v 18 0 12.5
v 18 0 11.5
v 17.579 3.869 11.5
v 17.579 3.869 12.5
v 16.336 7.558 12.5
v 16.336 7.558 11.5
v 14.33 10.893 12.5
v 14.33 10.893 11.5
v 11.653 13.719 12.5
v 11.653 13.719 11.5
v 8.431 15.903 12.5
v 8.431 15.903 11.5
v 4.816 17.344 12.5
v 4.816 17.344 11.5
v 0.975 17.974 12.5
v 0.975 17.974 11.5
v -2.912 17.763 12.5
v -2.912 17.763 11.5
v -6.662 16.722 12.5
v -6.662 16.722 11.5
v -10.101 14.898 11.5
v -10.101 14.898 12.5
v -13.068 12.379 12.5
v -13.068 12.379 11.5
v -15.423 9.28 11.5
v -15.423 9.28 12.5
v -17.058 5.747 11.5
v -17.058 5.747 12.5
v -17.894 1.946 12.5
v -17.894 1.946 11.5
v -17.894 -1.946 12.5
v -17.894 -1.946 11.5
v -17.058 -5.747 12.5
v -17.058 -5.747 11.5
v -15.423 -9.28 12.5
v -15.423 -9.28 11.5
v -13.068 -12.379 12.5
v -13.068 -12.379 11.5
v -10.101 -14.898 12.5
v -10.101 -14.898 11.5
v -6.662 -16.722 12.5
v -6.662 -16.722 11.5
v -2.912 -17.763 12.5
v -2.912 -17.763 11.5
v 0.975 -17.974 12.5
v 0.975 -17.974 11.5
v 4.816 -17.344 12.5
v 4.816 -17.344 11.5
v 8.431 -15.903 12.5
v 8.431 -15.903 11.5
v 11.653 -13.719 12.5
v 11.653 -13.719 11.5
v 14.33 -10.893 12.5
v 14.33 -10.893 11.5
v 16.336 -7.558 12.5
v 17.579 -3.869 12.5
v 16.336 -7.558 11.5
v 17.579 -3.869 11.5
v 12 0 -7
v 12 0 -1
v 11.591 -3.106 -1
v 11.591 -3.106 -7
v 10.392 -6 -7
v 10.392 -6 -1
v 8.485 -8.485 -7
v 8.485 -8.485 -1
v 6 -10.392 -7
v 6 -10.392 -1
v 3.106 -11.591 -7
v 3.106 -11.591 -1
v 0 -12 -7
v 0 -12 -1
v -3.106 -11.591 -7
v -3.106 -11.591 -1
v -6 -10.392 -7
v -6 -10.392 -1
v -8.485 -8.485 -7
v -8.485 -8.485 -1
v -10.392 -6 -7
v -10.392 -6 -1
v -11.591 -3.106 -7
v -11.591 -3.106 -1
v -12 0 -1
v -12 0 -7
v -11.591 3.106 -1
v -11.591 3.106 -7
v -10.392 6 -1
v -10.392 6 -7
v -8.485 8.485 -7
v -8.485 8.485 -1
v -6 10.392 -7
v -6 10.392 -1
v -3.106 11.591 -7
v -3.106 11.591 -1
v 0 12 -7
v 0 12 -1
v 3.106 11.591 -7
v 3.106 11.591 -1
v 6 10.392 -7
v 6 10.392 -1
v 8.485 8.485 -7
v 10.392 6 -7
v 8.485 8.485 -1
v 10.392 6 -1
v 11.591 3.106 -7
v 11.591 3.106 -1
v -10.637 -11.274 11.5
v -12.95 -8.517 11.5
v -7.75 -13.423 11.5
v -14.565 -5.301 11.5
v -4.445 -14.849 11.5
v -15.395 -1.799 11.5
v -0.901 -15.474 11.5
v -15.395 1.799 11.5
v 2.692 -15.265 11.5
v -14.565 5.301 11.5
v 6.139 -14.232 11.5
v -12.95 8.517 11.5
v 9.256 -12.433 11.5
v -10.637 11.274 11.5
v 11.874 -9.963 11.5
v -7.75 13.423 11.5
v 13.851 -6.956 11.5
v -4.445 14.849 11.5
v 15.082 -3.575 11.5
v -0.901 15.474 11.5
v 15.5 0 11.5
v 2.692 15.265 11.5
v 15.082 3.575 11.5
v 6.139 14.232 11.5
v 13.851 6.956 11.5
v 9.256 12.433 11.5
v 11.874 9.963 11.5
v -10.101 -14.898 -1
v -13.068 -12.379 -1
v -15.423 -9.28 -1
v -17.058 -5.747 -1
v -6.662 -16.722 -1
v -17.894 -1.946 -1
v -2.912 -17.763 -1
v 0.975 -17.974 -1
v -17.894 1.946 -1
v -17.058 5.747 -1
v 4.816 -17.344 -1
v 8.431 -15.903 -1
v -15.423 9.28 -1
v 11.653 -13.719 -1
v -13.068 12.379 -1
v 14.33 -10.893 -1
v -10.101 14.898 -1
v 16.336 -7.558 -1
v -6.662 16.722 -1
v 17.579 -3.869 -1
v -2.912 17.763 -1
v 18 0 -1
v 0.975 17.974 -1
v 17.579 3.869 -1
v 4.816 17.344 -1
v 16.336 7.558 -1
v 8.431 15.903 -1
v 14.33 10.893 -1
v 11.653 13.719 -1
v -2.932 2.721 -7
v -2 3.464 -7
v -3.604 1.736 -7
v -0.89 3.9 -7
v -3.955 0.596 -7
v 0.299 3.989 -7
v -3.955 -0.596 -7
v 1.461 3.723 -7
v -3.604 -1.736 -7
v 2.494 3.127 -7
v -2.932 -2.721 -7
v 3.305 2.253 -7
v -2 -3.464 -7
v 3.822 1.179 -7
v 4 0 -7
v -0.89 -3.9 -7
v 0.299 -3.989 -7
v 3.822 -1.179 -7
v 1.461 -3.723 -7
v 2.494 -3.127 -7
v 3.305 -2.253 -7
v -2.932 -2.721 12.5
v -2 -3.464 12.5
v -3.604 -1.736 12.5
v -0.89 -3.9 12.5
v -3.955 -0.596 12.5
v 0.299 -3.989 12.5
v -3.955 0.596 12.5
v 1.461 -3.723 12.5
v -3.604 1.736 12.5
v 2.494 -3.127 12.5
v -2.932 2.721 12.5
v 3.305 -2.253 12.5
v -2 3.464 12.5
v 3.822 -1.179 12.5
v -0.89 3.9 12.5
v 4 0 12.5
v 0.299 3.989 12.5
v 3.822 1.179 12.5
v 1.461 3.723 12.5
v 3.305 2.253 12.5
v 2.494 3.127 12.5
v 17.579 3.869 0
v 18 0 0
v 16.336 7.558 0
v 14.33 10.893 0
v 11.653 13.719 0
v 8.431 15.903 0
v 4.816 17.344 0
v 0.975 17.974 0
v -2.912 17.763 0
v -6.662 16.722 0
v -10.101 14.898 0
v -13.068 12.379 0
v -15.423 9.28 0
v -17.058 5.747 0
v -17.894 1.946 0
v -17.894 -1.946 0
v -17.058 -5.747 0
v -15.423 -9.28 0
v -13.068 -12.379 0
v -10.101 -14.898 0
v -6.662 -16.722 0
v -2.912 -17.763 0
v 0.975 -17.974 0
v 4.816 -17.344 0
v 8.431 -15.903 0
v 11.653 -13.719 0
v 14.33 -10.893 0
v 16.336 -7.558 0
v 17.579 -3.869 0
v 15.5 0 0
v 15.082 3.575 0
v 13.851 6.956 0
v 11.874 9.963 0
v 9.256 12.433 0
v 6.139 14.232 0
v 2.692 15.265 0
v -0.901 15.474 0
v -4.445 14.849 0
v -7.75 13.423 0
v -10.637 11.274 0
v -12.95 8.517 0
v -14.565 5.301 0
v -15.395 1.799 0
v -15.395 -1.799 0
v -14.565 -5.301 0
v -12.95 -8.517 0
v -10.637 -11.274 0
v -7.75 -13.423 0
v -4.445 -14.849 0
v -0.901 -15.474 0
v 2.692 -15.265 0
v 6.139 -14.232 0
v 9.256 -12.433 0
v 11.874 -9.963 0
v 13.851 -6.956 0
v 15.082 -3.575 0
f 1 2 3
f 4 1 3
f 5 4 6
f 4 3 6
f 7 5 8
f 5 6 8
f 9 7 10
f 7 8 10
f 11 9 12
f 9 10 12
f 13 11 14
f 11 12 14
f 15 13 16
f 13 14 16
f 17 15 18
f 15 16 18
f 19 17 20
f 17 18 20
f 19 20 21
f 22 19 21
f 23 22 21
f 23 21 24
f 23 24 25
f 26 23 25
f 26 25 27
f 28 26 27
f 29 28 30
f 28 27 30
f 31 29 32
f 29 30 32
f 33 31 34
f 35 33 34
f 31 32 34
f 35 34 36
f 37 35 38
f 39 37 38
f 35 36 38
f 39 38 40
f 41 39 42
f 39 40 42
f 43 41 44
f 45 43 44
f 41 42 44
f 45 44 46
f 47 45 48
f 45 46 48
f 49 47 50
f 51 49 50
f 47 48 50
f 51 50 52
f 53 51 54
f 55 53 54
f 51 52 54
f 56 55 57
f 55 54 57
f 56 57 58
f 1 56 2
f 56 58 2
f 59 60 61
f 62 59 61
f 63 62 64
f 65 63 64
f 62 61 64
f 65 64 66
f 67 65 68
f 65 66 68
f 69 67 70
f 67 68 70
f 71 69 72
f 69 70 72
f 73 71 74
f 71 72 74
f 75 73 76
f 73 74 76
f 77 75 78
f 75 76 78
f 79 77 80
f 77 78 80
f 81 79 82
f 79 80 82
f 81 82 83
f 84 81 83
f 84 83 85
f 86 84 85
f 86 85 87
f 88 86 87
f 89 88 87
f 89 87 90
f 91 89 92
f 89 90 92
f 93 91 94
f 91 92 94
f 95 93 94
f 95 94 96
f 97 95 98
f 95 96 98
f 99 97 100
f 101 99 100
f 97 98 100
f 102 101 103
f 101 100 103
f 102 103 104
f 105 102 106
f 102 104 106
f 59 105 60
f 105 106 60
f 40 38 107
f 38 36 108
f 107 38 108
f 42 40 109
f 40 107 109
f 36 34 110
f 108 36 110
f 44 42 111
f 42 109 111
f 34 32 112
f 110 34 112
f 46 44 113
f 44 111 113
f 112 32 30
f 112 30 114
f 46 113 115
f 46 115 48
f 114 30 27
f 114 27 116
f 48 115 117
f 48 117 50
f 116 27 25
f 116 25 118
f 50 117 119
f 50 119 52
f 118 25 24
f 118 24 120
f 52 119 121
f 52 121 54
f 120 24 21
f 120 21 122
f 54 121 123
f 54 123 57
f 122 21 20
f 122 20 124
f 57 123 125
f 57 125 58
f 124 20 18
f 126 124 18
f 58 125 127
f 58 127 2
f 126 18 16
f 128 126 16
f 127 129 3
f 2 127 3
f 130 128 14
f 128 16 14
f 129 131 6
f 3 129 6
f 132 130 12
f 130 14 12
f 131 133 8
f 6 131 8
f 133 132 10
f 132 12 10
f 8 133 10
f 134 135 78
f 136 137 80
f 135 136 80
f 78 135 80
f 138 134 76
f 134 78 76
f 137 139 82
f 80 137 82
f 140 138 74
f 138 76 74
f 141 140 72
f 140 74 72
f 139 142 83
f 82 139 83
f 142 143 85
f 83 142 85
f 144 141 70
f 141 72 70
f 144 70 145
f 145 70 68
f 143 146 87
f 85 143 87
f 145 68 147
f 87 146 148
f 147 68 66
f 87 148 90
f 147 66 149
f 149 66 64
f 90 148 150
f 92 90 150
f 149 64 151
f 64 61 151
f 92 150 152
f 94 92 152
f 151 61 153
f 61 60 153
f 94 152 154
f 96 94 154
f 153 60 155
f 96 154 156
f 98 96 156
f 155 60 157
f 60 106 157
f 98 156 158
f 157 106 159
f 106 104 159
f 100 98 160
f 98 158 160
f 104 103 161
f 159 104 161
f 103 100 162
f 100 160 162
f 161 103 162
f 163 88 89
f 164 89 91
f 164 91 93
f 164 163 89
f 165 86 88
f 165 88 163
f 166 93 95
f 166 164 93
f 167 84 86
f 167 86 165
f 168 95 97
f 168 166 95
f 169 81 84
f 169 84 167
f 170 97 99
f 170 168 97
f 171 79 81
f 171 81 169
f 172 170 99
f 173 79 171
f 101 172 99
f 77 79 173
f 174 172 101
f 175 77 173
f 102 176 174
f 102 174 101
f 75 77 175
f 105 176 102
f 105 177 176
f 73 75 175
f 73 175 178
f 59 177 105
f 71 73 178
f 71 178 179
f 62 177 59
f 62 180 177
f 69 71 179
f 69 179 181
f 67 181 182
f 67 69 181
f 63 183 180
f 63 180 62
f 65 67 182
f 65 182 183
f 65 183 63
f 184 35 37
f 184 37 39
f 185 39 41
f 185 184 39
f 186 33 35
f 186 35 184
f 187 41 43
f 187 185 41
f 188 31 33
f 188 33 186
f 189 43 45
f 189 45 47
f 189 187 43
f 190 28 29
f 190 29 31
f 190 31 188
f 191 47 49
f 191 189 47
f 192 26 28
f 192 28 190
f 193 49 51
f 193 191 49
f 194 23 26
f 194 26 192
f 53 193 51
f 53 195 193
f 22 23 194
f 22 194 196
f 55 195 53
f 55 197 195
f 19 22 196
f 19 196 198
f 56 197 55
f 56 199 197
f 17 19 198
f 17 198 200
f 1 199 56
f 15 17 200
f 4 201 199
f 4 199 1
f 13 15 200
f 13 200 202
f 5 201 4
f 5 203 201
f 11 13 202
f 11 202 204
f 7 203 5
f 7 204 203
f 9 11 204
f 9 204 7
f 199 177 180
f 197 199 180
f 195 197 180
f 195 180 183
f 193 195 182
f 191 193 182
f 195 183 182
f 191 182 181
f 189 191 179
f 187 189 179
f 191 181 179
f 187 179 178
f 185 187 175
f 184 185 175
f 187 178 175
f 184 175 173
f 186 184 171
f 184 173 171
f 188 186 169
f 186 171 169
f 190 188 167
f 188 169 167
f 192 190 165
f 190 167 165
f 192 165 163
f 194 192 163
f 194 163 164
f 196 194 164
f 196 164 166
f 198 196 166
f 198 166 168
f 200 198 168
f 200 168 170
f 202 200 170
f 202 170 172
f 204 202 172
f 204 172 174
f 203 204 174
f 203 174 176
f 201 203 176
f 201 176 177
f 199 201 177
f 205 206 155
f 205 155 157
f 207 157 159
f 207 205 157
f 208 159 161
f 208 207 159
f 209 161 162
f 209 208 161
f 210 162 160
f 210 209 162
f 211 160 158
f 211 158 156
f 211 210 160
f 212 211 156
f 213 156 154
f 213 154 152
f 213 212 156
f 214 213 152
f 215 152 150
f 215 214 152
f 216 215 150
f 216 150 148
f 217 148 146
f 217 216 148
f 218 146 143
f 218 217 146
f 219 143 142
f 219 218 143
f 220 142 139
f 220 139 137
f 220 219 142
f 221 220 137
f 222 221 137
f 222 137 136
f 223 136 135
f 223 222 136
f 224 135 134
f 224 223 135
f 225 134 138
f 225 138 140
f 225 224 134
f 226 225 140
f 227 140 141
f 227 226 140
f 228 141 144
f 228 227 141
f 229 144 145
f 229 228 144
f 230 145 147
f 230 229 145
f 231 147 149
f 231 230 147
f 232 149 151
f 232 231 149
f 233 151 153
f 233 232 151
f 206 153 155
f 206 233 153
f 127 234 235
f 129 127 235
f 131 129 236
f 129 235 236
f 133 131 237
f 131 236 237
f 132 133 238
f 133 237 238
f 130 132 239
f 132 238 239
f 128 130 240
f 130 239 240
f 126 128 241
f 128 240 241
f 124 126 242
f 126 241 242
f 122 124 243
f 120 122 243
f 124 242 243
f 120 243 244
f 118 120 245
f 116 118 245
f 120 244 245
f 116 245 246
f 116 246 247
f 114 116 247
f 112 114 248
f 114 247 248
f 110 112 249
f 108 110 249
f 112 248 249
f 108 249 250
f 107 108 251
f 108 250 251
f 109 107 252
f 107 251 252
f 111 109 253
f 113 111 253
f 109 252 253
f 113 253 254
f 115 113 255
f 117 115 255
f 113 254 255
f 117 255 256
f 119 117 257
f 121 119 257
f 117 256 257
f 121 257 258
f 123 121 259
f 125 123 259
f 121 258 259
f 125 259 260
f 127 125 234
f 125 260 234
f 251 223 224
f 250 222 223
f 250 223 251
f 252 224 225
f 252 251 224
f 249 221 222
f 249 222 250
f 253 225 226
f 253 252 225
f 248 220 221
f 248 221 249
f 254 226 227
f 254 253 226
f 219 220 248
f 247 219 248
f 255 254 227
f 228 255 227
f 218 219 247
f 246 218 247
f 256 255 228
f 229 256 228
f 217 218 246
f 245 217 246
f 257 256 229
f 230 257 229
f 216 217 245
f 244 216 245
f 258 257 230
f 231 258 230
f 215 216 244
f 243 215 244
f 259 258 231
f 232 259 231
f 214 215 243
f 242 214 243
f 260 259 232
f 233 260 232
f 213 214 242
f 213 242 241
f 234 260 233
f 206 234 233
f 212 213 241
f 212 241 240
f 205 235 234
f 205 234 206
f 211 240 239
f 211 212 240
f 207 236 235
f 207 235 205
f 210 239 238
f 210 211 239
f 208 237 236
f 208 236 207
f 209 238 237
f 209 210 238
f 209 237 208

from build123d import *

# Parameters (mm, degrees)
F0_R     = 15.5
F1_DEPTH = 11.5
F2_R     = 18
F3_DEPTH = 1
F4_R     = 18
F5_DEPTH = 1
F6_R     = 12
F7_DEPTH = 6
F8_R     = 4
F9_DEPTH = 19.501


with BuildPart() as f1:
    # F0 (on Top) → F1 (new body)
    with BuildSketch(Plane.XY):
        Circle(F0_R)
    extrude(amount=F1_DEPTH)

    # F2 (on face) → F3 (join)
    with BuildSketch(Plane.XY.offset(11.5)):
        Circle(F2_R)
    extrude(amount=F3_DEPTH)

    # F4 (on Top) → F5 (join)
    with BuildSketch(Plane.XY):
        Circle(F4_R)
    extrude(amount=-F5_DEPTH)

    # F6 (on face) → F7 (join)
    with BuildSketch(Plane(origin=(0, 0, -1), x_dir=(1, 0, 0), z_dir=(0, 0, -1))):
        Circle(F6_R)
    extrude(amount=F7_DEPTH)

    # F8 (on face) → F9 (cut, through all)
    with BuildSketch(Plane(origin=(0, 0, -7), x_dir=(1, 0, 0), z_dir=(0, 0, -1))):
        Circle(F8_R)
    extrude(amount=-F9_DEPTH, mode=Mode.SUBTRACT)


solid = f1.part
